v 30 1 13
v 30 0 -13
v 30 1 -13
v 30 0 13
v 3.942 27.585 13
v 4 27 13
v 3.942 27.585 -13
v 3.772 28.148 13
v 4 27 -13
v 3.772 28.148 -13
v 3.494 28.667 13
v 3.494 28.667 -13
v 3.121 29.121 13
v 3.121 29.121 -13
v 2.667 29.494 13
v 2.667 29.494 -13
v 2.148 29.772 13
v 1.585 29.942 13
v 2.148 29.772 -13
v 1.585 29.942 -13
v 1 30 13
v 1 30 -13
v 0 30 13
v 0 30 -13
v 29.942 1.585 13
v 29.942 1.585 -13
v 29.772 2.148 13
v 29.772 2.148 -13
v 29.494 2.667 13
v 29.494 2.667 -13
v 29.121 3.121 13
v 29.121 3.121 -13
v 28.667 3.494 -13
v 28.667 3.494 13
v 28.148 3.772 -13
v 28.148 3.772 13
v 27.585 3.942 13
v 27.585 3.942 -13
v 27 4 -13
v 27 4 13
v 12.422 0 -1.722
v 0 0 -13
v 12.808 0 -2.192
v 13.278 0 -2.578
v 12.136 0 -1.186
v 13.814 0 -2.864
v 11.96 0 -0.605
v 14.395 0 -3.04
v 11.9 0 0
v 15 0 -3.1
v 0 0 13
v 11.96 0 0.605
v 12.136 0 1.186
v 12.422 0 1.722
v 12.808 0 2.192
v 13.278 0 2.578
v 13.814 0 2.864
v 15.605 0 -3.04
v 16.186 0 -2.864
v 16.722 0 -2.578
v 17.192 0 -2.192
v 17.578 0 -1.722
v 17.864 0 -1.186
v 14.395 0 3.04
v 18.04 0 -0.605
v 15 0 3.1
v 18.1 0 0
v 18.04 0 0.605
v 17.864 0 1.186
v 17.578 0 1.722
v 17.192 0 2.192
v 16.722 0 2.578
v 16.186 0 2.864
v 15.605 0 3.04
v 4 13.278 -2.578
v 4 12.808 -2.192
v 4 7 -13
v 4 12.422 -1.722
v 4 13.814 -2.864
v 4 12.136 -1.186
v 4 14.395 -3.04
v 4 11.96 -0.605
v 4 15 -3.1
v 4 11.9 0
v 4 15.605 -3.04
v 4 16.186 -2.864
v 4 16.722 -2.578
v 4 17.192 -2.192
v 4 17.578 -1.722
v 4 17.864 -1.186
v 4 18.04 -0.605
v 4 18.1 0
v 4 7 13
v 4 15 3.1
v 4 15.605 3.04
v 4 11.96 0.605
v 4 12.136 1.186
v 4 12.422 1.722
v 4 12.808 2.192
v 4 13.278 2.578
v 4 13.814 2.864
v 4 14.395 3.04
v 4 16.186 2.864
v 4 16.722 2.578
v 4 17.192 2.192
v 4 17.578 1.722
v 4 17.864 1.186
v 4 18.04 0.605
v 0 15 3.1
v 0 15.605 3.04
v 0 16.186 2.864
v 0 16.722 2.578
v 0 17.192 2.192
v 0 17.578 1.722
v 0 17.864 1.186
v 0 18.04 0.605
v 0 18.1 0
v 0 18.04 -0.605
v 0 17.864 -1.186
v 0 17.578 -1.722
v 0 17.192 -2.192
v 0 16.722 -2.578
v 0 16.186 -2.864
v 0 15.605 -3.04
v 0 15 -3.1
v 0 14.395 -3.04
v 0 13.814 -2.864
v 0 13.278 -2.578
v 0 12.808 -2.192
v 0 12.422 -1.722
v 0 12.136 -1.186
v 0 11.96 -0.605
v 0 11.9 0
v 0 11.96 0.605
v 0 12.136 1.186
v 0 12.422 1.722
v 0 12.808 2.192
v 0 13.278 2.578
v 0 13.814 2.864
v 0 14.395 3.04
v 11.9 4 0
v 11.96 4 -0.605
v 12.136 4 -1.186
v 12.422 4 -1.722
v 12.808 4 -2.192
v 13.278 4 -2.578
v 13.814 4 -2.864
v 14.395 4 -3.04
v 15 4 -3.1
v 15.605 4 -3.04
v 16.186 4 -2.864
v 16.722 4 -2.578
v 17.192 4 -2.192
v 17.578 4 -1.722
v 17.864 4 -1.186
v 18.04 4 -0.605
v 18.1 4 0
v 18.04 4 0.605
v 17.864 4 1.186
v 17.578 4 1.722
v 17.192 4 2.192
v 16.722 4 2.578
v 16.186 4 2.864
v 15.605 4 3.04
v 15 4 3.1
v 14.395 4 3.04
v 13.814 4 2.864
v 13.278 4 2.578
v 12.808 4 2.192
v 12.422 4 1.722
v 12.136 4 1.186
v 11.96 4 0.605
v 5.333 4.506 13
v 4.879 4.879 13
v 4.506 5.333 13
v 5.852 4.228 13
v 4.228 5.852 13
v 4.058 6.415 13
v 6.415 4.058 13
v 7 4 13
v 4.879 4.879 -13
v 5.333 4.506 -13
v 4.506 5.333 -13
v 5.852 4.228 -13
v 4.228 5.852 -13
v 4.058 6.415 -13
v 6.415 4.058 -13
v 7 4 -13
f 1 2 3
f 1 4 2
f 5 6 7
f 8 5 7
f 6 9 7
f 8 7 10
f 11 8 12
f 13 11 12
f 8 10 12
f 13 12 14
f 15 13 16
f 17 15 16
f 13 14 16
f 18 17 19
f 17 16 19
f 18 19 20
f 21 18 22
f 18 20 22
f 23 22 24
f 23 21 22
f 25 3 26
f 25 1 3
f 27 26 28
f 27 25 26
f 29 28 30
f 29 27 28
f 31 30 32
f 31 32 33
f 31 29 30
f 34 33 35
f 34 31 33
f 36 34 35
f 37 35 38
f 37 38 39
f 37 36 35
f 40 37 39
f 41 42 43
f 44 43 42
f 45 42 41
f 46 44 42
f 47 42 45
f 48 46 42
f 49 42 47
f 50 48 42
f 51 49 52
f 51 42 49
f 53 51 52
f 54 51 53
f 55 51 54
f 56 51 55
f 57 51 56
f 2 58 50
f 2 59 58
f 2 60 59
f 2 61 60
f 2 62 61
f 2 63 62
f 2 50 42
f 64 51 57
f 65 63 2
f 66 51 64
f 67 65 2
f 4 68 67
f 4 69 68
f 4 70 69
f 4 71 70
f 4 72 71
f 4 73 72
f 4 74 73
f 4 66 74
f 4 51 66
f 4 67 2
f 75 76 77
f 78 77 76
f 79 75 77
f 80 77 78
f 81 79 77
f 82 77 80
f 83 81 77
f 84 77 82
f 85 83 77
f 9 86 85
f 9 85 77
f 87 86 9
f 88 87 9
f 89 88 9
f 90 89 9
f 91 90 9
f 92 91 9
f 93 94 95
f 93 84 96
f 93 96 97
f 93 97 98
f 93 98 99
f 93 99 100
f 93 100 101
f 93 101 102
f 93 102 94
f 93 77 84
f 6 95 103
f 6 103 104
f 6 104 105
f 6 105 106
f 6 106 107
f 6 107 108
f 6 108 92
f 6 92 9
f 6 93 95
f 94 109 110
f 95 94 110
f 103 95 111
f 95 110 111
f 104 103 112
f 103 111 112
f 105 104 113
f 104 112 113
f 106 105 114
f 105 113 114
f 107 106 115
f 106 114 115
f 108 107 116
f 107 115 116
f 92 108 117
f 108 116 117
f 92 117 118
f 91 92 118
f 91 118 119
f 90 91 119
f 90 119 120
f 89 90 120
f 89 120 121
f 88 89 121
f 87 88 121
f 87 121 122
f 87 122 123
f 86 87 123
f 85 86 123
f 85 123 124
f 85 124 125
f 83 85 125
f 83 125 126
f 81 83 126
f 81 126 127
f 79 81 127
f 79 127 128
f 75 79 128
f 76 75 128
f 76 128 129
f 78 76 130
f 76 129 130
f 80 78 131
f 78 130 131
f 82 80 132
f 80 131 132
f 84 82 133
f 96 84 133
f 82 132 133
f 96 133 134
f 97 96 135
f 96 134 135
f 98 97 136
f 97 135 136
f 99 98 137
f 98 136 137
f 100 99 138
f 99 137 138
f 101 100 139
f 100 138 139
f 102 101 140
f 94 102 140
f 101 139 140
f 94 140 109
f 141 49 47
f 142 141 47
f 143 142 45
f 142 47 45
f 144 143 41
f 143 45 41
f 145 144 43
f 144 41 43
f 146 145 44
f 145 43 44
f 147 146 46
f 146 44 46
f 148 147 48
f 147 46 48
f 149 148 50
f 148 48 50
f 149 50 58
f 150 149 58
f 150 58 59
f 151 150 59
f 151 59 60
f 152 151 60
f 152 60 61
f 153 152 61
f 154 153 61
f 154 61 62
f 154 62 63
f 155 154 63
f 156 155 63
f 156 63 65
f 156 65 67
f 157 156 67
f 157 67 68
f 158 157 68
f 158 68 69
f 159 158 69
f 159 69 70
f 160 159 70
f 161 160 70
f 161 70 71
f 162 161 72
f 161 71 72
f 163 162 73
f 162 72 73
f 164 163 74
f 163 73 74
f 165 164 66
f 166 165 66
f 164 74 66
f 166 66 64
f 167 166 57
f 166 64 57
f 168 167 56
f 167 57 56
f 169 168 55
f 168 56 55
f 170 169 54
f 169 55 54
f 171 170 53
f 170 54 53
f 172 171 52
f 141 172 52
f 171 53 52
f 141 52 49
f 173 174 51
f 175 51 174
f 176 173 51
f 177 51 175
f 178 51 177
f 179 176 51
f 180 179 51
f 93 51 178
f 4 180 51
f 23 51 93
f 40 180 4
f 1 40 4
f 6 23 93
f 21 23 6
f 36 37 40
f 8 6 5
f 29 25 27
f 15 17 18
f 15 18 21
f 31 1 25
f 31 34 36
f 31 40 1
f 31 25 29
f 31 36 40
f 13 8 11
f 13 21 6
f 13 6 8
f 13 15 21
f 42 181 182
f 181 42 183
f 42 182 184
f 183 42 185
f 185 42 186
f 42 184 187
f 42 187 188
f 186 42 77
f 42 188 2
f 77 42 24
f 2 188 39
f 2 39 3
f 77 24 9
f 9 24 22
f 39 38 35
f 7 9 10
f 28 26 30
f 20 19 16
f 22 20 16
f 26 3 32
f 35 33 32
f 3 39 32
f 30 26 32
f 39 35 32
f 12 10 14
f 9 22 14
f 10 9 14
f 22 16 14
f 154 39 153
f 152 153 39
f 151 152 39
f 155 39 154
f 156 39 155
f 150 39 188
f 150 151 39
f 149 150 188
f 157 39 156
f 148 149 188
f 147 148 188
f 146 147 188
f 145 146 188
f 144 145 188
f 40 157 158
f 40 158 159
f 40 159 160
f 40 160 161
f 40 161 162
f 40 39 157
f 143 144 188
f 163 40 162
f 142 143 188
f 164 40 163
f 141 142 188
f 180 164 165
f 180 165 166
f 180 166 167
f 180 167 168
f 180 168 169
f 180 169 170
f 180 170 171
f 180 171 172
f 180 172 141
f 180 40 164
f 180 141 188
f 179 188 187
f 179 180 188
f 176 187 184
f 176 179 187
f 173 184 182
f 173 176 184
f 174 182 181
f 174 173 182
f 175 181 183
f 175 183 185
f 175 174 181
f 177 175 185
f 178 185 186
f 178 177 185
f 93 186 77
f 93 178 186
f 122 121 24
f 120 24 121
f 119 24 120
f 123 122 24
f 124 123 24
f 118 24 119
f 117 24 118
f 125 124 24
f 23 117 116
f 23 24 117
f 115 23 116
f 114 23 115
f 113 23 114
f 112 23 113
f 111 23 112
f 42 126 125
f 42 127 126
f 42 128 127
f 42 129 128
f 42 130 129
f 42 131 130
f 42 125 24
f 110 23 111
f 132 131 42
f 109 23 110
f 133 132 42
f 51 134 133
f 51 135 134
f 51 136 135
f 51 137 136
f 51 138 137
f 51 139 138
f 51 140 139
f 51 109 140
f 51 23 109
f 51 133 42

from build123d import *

# Parameters (mm, degrees)
EXTRUDE_1_DEPTH         = 13
HOLE_WIZARD_6_2_6_2_1_D = 6.2
HOLE_WIZARD_6_2_6_2_2_D = 6.2
FILLET_1_R              = 3


with BuildPart() as part:
    # 草图1 → 凸台-拉伸1 (new, symmetric)
    with BuildSketch(Plane.XY):
        Polygon((0, 0), (30, 0), (30, 4), (4, 4), (4, 30), (0, 30), align=None)
    extrude(amount=EXTRUDE_1_DEPTH, both=True)

    # Ø6.2 (6.2) 直径孔1 (through all)
    with Locations(Plane(origin=(0, 4, 0), x_dir=(1, 0, 0), z_dir=(0, 1, 0))):
        with Locations((15, 0)):
            Hole(HOLE_WIZARD_6_2_6_2_1_D / 2)

    # Ø6.2 (6.2) 直径孔2 (through all)
    with Locations(Plane(origin=(4, 0, 0), x_dir=(0, 0, -1), z_dir=(1, 0, 0))):
        with Locations((0, 15)):
            Hole(HOLE_WIZARD_6_2_6_2_2_D / 2)

    # 圆角1
    fillet_1_edges = [part.edges().sort_by_distance(p)[0] for p in [
        (4, 30, 0),
        (4, 4, 0),
        (30, 4, 0),
    ]]
    fillet(fillet_1_edges, radius=FILLET_1_R)


solid = part.part
